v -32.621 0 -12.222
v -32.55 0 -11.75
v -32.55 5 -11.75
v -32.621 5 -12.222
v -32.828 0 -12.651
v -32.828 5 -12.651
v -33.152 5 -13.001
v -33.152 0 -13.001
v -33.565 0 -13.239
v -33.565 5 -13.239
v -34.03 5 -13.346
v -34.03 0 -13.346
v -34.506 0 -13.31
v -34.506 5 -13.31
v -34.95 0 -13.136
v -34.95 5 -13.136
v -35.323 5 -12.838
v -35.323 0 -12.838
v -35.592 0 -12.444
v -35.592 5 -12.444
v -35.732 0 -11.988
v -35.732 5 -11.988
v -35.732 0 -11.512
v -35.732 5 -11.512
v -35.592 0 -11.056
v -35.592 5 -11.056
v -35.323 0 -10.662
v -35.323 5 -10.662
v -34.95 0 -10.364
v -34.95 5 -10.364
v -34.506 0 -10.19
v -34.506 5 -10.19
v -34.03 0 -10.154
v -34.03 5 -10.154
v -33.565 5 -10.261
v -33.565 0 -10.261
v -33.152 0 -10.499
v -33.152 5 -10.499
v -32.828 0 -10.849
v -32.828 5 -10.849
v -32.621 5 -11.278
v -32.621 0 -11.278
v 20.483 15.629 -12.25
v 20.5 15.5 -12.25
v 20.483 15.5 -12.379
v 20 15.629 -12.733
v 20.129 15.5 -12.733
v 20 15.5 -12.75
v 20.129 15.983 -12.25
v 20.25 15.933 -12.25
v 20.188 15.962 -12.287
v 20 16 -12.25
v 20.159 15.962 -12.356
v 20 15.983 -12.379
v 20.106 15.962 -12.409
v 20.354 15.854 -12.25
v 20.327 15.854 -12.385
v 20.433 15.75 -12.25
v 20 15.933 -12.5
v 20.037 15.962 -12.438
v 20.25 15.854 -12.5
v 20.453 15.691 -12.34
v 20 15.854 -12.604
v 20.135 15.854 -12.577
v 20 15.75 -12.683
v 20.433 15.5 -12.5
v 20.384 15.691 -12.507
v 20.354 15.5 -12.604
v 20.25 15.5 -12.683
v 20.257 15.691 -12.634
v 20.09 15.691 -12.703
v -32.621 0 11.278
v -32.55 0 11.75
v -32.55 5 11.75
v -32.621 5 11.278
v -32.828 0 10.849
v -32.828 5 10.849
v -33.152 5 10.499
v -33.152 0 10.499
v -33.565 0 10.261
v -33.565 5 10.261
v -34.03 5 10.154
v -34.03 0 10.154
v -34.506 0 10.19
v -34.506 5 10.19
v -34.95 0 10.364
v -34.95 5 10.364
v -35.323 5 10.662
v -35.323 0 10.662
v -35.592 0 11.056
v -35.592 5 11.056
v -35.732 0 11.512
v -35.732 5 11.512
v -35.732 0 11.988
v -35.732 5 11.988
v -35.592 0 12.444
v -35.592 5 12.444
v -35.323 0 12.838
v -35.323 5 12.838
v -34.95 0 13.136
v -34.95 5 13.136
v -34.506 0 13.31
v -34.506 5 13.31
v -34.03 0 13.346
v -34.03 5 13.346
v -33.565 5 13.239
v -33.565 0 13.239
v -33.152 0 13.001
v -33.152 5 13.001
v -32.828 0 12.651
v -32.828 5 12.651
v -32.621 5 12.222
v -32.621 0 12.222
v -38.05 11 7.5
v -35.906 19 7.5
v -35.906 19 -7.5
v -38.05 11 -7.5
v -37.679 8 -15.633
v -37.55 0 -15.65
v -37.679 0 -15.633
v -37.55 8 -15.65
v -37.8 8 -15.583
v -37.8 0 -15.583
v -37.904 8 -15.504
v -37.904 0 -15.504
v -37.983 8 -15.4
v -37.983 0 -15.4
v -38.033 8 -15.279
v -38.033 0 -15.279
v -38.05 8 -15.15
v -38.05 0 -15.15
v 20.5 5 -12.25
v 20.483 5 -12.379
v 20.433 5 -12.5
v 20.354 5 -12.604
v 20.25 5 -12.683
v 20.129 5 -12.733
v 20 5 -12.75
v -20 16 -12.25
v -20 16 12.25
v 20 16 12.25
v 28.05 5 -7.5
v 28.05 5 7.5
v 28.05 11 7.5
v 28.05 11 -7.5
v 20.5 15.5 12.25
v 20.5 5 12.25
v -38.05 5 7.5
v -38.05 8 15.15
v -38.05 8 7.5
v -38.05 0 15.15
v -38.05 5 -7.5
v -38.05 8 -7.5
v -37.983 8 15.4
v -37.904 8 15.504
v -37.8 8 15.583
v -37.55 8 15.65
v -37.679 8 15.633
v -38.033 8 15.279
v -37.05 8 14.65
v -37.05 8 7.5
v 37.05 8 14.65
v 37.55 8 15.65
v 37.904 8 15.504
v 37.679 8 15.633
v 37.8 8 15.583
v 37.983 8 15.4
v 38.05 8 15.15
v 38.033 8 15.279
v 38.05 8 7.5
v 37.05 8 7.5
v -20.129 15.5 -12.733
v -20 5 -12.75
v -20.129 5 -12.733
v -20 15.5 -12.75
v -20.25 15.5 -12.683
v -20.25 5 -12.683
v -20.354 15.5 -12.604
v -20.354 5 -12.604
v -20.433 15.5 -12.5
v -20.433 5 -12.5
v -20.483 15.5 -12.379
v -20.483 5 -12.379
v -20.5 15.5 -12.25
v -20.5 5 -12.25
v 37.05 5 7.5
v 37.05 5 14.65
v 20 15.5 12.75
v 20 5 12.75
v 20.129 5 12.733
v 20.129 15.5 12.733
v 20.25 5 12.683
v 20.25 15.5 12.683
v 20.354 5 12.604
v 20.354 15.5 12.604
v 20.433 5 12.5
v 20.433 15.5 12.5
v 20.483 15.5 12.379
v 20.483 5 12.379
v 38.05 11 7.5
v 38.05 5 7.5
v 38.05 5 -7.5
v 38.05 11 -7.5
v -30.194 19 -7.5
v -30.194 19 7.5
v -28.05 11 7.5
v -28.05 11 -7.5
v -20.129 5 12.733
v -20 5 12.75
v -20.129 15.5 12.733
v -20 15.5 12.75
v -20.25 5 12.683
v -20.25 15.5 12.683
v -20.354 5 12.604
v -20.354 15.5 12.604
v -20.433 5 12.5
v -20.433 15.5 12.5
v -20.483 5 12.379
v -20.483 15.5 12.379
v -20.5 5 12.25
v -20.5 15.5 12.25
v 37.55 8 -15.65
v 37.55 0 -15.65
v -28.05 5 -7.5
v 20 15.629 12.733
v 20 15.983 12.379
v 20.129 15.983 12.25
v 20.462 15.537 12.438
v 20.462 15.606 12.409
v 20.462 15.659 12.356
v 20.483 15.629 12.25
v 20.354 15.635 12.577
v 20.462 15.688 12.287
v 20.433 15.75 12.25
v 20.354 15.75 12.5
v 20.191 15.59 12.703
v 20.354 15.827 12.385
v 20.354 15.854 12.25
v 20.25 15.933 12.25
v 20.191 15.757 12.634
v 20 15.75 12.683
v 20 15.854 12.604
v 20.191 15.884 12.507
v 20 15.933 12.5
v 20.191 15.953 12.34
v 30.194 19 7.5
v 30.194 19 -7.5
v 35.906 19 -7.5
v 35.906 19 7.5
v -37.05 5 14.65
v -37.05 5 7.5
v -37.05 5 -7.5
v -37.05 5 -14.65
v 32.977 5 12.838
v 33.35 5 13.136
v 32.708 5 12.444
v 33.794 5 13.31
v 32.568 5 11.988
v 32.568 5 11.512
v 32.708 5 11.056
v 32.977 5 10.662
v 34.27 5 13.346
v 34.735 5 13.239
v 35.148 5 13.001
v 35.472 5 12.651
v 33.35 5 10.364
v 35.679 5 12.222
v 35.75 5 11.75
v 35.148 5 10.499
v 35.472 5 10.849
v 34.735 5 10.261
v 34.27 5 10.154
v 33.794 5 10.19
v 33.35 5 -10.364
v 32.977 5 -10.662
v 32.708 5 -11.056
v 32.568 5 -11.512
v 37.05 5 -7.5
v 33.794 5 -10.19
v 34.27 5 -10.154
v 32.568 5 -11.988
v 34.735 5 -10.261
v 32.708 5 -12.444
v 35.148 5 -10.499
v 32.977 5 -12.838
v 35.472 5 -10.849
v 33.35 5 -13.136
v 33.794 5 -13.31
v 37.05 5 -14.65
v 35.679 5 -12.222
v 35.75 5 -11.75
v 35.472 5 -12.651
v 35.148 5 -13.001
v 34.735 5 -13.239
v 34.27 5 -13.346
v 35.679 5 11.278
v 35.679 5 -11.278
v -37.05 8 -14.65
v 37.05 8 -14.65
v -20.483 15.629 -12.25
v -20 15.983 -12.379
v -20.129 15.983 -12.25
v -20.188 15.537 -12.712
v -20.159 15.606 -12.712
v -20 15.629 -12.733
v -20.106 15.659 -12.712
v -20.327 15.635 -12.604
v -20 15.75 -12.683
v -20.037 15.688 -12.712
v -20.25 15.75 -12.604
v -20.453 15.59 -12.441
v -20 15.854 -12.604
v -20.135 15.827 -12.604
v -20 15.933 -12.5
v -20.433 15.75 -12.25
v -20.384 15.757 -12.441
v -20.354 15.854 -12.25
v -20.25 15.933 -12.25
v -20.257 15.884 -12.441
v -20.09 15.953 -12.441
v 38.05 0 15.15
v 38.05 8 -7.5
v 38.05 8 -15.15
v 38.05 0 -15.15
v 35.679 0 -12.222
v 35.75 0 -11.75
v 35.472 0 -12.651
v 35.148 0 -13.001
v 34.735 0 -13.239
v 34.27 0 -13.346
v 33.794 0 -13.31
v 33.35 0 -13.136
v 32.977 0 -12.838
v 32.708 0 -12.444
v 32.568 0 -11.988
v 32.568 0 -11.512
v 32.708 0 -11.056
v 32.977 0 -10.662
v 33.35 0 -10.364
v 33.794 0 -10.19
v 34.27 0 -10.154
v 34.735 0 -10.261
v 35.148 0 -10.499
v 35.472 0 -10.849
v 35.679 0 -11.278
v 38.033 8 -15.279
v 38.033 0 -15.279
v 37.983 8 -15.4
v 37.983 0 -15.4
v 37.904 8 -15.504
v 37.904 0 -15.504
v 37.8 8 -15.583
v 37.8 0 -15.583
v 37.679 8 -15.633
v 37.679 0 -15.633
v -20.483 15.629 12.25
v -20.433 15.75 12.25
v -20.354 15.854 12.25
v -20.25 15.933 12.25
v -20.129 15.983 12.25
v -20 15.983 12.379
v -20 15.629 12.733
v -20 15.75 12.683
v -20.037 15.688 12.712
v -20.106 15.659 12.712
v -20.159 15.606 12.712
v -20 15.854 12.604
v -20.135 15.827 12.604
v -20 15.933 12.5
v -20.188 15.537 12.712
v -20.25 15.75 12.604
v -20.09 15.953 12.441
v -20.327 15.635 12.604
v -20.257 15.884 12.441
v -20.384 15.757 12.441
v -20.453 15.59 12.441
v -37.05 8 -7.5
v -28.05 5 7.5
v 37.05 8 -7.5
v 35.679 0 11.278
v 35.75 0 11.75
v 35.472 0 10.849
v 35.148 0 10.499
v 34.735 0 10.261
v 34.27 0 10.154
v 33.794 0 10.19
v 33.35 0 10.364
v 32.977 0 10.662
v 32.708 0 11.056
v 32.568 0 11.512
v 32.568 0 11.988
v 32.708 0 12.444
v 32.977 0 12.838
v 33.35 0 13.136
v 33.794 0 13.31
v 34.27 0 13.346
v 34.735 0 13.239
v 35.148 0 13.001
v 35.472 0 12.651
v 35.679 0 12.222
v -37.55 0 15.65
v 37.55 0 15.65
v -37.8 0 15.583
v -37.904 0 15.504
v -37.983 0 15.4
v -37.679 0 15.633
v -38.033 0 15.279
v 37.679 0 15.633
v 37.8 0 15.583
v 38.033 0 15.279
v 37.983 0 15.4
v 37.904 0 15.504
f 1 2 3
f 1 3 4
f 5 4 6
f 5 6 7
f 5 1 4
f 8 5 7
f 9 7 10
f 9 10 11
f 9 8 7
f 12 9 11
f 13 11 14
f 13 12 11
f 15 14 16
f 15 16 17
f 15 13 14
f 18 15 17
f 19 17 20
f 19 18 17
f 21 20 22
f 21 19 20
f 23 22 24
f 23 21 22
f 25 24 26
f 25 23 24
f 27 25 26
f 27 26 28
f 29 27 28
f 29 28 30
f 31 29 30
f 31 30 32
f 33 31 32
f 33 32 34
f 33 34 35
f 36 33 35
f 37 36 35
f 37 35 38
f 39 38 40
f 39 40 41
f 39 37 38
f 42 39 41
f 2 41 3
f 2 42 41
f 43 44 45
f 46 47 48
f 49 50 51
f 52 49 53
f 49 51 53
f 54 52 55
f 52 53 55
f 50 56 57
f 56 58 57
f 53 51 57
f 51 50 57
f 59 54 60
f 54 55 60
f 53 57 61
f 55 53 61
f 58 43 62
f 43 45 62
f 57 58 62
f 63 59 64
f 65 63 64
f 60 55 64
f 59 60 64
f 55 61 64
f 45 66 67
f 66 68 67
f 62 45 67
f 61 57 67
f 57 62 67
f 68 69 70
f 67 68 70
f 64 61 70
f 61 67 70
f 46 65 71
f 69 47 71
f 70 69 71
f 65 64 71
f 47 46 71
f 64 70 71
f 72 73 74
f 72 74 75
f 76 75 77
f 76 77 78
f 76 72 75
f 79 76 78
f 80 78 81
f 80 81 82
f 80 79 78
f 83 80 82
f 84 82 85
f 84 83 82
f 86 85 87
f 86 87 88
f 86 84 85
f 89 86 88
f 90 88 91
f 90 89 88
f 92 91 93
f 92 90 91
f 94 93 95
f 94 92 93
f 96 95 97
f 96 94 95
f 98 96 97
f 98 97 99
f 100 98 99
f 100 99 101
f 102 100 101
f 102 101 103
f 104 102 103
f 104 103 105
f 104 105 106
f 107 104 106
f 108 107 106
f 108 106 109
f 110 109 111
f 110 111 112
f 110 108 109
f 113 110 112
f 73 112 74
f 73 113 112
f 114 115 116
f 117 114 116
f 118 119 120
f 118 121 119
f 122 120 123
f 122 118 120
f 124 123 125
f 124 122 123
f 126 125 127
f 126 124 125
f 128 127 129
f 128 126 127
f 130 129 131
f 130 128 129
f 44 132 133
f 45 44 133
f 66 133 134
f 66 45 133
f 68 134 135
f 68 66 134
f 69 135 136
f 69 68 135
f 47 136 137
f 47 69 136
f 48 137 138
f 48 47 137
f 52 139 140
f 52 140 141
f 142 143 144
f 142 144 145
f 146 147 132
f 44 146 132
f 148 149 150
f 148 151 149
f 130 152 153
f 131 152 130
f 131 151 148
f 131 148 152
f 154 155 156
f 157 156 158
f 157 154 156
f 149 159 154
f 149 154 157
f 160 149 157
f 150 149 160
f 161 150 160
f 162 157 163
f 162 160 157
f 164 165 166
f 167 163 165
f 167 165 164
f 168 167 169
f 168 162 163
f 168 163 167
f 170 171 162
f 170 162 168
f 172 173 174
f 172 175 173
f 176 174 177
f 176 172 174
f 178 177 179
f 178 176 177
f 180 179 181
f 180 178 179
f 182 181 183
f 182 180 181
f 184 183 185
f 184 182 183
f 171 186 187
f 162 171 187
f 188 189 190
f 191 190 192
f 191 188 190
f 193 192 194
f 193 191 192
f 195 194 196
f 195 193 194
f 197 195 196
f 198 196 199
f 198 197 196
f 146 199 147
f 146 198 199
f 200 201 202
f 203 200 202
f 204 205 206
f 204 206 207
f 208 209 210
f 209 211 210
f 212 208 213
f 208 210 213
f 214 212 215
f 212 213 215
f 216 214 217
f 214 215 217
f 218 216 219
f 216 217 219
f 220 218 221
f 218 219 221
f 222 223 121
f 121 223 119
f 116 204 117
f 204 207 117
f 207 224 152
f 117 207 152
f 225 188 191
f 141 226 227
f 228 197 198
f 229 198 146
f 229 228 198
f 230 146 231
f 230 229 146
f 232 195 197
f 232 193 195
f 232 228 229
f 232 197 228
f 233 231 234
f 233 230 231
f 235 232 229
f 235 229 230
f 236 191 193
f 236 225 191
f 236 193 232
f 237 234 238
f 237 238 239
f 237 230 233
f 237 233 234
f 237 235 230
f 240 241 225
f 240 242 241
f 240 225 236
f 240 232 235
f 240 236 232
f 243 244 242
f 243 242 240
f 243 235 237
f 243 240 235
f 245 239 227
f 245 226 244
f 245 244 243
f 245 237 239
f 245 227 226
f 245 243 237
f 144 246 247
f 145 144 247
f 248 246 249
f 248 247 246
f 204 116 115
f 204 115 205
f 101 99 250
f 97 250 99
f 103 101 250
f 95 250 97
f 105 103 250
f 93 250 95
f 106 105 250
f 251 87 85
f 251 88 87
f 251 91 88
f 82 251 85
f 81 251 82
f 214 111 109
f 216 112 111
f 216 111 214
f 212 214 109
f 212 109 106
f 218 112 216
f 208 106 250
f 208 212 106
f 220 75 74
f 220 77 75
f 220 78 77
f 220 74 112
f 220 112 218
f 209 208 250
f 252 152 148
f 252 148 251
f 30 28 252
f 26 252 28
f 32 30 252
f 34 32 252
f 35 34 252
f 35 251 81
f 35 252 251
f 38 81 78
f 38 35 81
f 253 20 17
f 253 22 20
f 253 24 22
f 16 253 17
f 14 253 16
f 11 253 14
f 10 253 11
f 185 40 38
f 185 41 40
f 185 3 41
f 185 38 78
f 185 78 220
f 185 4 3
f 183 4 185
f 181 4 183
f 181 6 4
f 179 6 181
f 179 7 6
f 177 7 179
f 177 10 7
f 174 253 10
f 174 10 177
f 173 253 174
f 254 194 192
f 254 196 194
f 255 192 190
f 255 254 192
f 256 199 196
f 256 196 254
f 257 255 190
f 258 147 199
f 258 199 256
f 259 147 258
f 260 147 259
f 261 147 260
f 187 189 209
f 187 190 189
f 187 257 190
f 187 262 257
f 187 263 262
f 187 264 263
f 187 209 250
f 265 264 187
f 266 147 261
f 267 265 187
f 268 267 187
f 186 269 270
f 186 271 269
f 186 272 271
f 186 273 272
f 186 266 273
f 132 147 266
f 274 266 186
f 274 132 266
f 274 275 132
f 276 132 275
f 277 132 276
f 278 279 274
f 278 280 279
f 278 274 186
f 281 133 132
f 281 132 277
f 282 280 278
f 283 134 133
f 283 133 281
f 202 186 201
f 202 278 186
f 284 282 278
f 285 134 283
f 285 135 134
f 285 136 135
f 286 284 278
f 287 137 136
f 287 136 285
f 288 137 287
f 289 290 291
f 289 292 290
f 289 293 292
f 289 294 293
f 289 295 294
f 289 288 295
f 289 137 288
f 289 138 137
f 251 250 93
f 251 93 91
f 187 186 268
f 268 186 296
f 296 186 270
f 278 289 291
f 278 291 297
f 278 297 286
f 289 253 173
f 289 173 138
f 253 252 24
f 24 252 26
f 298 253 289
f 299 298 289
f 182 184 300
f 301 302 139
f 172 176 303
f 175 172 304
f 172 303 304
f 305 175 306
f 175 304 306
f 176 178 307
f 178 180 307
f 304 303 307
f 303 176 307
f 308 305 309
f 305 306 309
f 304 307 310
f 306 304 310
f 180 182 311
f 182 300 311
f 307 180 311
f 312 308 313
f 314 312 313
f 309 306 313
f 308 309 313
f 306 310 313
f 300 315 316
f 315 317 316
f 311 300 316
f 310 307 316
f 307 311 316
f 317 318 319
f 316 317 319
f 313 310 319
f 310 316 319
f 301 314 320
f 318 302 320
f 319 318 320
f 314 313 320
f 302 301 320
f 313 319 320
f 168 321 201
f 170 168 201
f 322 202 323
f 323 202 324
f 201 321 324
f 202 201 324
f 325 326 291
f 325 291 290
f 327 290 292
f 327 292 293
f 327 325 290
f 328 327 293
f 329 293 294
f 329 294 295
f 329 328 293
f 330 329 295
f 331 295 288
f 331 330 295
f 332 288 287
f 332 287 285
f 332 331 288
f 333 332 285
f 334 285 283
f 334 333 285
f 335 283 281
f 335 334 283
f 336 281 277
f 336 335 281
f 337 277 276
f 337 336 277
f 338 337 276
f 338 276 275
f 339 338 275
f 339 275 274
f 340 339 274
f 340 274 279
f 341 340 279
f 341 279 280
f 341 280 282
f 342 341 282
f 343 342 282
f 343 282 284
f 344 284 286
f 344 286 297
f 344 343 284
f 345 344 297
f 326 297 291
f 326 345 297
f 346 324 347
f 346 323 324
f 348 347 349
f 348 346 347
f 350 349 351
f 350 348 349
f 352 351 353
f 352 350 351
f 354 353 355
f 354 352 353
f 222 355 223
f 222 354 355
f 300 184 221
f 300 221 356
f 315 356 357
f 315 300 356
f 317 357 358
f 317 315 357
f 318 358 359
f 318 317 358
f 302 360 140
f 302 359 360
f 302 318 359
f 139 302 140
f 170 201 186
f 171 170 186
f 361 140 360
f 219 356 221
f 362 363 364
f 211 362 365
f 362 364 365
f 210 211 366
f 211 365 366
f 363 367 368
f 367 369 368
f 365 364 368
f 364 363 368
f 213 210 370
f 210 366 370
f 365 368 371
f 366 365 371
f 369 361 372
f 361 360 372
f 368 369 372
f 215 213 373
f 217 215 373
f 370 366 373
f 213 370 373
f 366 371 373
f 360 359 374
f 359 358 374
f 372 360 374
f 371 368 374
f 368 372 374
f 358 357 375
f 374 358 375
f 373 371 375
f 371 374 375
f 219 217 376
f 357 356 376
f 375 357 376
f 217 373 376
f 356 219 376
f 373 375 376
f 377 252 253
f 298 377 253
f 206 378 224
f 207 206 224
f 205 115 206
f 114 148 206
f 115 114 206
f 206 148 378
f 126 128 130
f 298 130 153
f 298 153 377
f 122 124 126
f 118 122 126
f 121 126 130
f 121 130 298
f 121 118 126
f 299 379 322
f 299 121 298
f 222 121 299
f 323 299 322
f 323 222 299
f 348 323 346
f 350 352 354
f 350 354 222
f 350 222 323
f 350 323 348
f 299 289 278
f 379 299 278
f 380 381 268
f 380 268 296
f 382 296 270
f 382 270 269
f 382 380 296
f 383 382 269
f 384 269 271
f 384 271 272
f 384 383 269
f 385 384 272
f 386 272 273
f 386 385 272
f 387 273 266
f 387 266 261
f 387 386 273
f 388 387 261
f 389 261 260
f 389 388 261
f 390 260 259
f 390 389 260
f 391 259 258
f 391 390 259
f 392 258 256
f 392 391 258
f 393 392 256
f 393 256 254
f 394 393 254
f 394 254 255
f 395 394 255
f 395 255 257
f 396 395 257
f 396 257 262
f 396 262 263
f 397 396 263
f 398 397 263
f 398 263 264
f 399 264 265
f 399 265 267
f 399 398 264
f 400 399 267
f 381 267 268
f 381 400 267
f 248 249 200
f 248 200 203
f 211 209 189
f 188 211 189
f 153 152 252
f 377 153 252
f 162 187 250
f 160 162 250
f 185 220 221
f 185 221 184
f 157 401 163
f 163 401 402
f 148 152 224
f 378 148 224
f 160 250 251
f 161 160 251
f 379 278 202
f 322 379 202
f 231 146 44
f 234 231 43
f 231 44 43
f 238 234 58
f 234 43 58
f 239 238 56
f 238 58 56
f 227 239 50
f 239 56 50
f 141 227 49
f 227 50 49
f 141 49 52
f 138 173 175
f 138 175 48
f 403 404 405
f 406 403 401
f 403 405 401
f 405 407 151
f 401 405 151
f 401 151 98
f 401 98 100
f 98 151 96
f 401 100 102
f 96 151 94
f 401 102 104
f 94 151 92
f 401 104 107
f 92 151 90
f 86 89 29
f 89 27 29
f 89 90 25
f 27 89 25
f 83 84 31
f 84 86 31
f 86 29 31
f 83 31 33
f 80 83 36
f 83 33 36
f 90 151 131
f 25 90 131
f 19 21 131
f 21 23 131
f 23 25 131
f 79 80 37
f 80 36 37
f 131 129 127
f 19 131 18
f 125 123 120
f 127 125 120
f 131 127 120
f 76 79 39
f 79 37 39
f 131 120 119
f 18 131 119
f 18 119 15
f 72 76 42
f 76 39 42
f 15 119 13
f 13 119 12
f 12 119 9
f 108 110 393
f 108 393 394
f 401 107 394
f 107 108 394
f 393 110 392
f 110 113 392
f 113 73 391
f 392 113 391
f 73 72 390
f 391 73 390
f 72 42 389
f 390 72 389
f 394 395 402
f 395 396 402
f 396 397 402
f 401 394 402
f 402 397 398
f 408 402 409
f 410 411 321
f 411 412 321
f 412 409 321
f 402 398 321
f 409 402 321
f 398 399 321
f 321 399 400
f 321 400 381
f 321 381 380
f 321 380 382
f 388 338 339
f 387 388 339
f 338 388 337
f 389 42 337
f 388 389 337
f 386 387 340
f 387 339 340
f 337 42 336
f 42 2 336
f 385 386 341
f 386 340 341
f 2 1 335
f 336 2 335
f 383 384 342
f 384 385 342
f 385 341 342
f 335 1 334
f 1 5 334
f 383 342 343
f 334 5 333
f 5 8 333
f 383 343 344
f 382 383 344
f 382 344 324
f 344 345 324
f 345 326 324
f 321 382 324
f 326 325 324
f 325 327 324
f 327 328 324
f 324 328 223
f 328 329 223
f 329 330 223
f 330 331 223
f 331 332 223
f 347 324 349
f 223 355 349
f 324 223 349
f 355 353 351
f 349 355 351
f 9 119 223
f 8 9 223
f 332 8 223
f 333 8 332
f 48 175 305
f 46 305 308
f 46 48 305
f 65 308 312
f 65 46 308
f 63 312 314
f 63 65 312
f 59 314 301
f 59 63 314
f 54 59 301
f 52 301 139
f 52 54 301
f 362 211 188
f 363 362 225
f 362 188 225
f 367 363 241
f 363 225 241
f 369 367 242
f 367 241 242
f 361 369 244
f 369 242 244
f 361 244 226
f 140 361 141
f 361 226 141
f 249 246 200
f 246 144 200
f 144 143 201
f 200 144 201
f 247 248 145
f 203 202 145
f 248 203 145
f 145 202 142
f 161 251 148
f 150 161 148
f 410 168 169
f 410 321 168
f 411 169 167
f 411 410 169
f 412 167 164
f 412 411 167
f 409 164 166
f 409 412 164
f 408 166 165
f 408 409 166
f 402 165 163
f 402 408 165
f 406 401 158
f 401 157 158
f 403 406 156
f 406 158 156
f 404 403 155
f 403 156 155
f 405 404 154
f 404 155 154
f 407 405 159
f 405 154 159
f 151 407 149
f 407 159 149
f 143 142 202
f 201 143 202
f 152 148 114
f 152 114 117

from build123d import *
from OCP.BRepFilletAPI import BRepFilletAPI_MakeChamfer

# Parameters (mm, degrees)
SKETCH1_W             = 76.1
SKETCH1_H             = 31.3
SKETCH1_R             = 1.6
BOSS_EXTRUDE1_DEPTH   = 5
BOSS_EXTRUDE2_DEPTH   = 3
SKETCH2_3_W           = 41
SKETCH2_3_H           = 25.5
BOSS_EXTRUDE3_DEPTH   = 11
SKETCH2_4_W           = 10
SKETCH2_4_H           = 15
BOSS_EXTRUDE4_DEPTH   = 14
BOSS_EXTRUDE4_2_DEPTH = 14
FILLET1_R             = 0.5
CHAMFER1_SIZE         = 8
CHAMFER1_SIZE2        = 2.143593539
CHAMFER2_SIZE         = 8
CHAMFER2_SIZE2        = 2.143593539


with BuildPart() as part:
    # Sketch1 → Boss-Extrude1 (new body)
    with BuildSketch(Plane(origin=(0, 0, 0), x_dir=(1, 0, 0), z_dir=(0, 1, 0))):
        Rectangle(SKETCH1_W, SKETCH1_H)
        with Locations((34.15, 11.75)):
            Circle(SKETCH1_R, mode=Mode.SUBTRACT)
        with Locations((34.15, -11.75)):
            Circle(SKETCH1_R, mode=Mode.SUBTRACT)
        with Locations((-34.15, -11.75)):
            Circle(SKETCH1_R, mode=Mode.SUBTRACT)
        with Locations((-34.15, 11.75)):
            Circle(SKETCH1_R, mode=Mode.SUBTRACT)
    extrude(amount=BOSS_EXTRUDE1_DEPTH)

    # Sketch2 → Boss-Extrude2 (add)
    with BuildSketch(Plane(origin=(0, 5, 0), x_dir=(1, 0, 0), z_dir=(0, 1, 0))):
        Polygon((-38.05, -15.65), (38.05, -15.65), (38.05, -7.5), (37.05, -7.5), (37.05, -14.65), (-37.05, -14.65), (-37.05, -7.5), (-38.05, -7.5), align=None)
        Polygon((37.05, 7.5), (38.05, 7.5), (38.05, 15.65), (-38.05, 15.65), (-38.05, 7.5), (-37.05, 7.5), (-37.05, 14.65), (37.05, 14.65), align=None)
    extrude(amount=BOSS_EXTRUDE2_DEPTH)

    # Sketch2<3> → Boss-Extrude3 (add)
    with BuildSketch(Plane(origin=(0, 5, 0), x_dir=(1, 0, 0), z_dir=(0, 1, 0))):
        Rectangle(SKETCH2_3_W, SKETCH2_3_H)
    extrude(amount=BOSS_EXTRUDE3_DEPTH)

    # Fillet1
    fillet1_edges = [part.edges().sort_by_distance(p)[0] for p in [
        (0, 16, -12.75),
        (-20.5, 16, 0),
        (0, 16, 12.75),
        (20.5, 16, 0),
        (20.5, 10.5, 12.75),
        (20.5, 10.5, -12.75),
        (-20.5, 10.5, -12.75),
        (-20.5, 10.5, 12.75),
        (-38.05, 4, 15.65),
        (-38.05, 4, -15.65),
        (38.05, 4, -15.65),
        (38.05, 4, 15.65),
    ]]
    fillet(fillet1_edges, radius=FILLET1_R)


with BuildPart() as body_2:
    # Sketch2<4> → Boss-Extrude4 (new body)
    with BuildSketch(Plane(origin=(0, 5, 0), x_dir=(1, 0, 0), z_dir=(0, 1, 0))):
        with Locations((33.05, 0)):
            Rectangle(SKETCH2_4_W, SKETCH2_4_H)
    extrude(amount=BOSS_EXTRUDE4_DEPTH)

    # Chamfer2: one chamfer whose edges measure the first distance from different faces: ONE call of the kernel's chamfer builder (chamfer() names one face for all edges)
    chamfer2_edges_1 = [body_2.edges().sort_by_distance(p)[0] for p in [
        (38.05, 19, 0),
    ]]
    chamfer2_side_1 = [body_2.faces().sort_by_distance(p)[0] for p in [
        (38.05, 12, 0),
    ]]
    chamfer2_edges_2 = [body_2.edges().sort_by_distance(p)[0] for p in [
        (28.05, 19, 0),
    ]]
    chamfer2_side_2 = [body_2.faces().sort_by_distance(p)[0] for p in [
        (28.05, 12, 0),
    ]]
    chamfer2 = BRepFilletAPI_MakeChamfer(body_2.part.solid().wrapped)
    for e in chamfer2_edges_1:
        chamfer2.Add(CHAMFER2_SIZE, CHAMFER2_SIZE2, e.wrapped, chamfer2_side_1[0].wrapped)  # the first distance lies on this face
    for e in chamfer2_edges_2:
        chamfer2.Add(CHAMFER2_SIZE, CHAMFER2_SIZE2, e.wrapped, chamfer2_side_2[0].wrapped)  # the first distance lies on this face
    add(Compound.cast(chamfer2.Shape()), mode=Mode.REPLACE)


with BuildPart() as body_3:
    # Sketch2<4> → Boss-Extrude4 2 (new body)
    with BuildSketch(Plane(origin=(0, 5, 0), x_dir=(1, 0, 0), z_dir=(0, 1, 0))):
        with Locations((-33.05, 0)):
            Rectangle(SKETCH2_4_W, SKETCH2_4_H)
    extrude(amount=BOSS_EXTRUDE4_2_DEPTH)

    # Chamfer1: one chamfer whose edges measure the first distance from different faces: ONE call of the kernel's chamfer builder (chamfer() names one face for all edges)
    chamfer1_edges_1 = [body_3.edges().sort_by_distance(p)[0] for p in [
        (-28.05, 19, 0),
    ]]
    chamfer1_side_1 = [body_3.faces().sort_by_distance(p)[0] for p in [
        (-28.05, 12, 0),
    ]]
    chamfer1_edges_2 = [body_3.edges().sort_by_distance(p)[0] for p in [
        (-38.05, 19, 0),
    ]]
    chamfer1_side_2 = [body_3.faces().sort_by_distance(p)[0] for p in [
        (-38.05, 12, 0),
    ]]
    chamfer1 = BRepFilletAPI_MakeChamfer(body_3.part.solid().wrapped)
    for e in chamfer1_edges_1:
        chamfer1.Add(CHAMFER1_SIZE, CHAMFER1_SIZE2, e.wrapped, chamfer1_side_1[0].wrapped)  # the first distance lies on this face
    for e in chamfer1_edges_2:
        chamfer1.Add(CHAMFER1_SIZE, CHAMFER1_SIZE2, e.wrapped, chamfer1_side_2[0].wrapped)  # the first distance lies on this face
    add(Compound.cast(chamfer1.Shape()), mode=Mode.REPLACE)


solid = Compound([part.part, body_2.part, body_3.part])
